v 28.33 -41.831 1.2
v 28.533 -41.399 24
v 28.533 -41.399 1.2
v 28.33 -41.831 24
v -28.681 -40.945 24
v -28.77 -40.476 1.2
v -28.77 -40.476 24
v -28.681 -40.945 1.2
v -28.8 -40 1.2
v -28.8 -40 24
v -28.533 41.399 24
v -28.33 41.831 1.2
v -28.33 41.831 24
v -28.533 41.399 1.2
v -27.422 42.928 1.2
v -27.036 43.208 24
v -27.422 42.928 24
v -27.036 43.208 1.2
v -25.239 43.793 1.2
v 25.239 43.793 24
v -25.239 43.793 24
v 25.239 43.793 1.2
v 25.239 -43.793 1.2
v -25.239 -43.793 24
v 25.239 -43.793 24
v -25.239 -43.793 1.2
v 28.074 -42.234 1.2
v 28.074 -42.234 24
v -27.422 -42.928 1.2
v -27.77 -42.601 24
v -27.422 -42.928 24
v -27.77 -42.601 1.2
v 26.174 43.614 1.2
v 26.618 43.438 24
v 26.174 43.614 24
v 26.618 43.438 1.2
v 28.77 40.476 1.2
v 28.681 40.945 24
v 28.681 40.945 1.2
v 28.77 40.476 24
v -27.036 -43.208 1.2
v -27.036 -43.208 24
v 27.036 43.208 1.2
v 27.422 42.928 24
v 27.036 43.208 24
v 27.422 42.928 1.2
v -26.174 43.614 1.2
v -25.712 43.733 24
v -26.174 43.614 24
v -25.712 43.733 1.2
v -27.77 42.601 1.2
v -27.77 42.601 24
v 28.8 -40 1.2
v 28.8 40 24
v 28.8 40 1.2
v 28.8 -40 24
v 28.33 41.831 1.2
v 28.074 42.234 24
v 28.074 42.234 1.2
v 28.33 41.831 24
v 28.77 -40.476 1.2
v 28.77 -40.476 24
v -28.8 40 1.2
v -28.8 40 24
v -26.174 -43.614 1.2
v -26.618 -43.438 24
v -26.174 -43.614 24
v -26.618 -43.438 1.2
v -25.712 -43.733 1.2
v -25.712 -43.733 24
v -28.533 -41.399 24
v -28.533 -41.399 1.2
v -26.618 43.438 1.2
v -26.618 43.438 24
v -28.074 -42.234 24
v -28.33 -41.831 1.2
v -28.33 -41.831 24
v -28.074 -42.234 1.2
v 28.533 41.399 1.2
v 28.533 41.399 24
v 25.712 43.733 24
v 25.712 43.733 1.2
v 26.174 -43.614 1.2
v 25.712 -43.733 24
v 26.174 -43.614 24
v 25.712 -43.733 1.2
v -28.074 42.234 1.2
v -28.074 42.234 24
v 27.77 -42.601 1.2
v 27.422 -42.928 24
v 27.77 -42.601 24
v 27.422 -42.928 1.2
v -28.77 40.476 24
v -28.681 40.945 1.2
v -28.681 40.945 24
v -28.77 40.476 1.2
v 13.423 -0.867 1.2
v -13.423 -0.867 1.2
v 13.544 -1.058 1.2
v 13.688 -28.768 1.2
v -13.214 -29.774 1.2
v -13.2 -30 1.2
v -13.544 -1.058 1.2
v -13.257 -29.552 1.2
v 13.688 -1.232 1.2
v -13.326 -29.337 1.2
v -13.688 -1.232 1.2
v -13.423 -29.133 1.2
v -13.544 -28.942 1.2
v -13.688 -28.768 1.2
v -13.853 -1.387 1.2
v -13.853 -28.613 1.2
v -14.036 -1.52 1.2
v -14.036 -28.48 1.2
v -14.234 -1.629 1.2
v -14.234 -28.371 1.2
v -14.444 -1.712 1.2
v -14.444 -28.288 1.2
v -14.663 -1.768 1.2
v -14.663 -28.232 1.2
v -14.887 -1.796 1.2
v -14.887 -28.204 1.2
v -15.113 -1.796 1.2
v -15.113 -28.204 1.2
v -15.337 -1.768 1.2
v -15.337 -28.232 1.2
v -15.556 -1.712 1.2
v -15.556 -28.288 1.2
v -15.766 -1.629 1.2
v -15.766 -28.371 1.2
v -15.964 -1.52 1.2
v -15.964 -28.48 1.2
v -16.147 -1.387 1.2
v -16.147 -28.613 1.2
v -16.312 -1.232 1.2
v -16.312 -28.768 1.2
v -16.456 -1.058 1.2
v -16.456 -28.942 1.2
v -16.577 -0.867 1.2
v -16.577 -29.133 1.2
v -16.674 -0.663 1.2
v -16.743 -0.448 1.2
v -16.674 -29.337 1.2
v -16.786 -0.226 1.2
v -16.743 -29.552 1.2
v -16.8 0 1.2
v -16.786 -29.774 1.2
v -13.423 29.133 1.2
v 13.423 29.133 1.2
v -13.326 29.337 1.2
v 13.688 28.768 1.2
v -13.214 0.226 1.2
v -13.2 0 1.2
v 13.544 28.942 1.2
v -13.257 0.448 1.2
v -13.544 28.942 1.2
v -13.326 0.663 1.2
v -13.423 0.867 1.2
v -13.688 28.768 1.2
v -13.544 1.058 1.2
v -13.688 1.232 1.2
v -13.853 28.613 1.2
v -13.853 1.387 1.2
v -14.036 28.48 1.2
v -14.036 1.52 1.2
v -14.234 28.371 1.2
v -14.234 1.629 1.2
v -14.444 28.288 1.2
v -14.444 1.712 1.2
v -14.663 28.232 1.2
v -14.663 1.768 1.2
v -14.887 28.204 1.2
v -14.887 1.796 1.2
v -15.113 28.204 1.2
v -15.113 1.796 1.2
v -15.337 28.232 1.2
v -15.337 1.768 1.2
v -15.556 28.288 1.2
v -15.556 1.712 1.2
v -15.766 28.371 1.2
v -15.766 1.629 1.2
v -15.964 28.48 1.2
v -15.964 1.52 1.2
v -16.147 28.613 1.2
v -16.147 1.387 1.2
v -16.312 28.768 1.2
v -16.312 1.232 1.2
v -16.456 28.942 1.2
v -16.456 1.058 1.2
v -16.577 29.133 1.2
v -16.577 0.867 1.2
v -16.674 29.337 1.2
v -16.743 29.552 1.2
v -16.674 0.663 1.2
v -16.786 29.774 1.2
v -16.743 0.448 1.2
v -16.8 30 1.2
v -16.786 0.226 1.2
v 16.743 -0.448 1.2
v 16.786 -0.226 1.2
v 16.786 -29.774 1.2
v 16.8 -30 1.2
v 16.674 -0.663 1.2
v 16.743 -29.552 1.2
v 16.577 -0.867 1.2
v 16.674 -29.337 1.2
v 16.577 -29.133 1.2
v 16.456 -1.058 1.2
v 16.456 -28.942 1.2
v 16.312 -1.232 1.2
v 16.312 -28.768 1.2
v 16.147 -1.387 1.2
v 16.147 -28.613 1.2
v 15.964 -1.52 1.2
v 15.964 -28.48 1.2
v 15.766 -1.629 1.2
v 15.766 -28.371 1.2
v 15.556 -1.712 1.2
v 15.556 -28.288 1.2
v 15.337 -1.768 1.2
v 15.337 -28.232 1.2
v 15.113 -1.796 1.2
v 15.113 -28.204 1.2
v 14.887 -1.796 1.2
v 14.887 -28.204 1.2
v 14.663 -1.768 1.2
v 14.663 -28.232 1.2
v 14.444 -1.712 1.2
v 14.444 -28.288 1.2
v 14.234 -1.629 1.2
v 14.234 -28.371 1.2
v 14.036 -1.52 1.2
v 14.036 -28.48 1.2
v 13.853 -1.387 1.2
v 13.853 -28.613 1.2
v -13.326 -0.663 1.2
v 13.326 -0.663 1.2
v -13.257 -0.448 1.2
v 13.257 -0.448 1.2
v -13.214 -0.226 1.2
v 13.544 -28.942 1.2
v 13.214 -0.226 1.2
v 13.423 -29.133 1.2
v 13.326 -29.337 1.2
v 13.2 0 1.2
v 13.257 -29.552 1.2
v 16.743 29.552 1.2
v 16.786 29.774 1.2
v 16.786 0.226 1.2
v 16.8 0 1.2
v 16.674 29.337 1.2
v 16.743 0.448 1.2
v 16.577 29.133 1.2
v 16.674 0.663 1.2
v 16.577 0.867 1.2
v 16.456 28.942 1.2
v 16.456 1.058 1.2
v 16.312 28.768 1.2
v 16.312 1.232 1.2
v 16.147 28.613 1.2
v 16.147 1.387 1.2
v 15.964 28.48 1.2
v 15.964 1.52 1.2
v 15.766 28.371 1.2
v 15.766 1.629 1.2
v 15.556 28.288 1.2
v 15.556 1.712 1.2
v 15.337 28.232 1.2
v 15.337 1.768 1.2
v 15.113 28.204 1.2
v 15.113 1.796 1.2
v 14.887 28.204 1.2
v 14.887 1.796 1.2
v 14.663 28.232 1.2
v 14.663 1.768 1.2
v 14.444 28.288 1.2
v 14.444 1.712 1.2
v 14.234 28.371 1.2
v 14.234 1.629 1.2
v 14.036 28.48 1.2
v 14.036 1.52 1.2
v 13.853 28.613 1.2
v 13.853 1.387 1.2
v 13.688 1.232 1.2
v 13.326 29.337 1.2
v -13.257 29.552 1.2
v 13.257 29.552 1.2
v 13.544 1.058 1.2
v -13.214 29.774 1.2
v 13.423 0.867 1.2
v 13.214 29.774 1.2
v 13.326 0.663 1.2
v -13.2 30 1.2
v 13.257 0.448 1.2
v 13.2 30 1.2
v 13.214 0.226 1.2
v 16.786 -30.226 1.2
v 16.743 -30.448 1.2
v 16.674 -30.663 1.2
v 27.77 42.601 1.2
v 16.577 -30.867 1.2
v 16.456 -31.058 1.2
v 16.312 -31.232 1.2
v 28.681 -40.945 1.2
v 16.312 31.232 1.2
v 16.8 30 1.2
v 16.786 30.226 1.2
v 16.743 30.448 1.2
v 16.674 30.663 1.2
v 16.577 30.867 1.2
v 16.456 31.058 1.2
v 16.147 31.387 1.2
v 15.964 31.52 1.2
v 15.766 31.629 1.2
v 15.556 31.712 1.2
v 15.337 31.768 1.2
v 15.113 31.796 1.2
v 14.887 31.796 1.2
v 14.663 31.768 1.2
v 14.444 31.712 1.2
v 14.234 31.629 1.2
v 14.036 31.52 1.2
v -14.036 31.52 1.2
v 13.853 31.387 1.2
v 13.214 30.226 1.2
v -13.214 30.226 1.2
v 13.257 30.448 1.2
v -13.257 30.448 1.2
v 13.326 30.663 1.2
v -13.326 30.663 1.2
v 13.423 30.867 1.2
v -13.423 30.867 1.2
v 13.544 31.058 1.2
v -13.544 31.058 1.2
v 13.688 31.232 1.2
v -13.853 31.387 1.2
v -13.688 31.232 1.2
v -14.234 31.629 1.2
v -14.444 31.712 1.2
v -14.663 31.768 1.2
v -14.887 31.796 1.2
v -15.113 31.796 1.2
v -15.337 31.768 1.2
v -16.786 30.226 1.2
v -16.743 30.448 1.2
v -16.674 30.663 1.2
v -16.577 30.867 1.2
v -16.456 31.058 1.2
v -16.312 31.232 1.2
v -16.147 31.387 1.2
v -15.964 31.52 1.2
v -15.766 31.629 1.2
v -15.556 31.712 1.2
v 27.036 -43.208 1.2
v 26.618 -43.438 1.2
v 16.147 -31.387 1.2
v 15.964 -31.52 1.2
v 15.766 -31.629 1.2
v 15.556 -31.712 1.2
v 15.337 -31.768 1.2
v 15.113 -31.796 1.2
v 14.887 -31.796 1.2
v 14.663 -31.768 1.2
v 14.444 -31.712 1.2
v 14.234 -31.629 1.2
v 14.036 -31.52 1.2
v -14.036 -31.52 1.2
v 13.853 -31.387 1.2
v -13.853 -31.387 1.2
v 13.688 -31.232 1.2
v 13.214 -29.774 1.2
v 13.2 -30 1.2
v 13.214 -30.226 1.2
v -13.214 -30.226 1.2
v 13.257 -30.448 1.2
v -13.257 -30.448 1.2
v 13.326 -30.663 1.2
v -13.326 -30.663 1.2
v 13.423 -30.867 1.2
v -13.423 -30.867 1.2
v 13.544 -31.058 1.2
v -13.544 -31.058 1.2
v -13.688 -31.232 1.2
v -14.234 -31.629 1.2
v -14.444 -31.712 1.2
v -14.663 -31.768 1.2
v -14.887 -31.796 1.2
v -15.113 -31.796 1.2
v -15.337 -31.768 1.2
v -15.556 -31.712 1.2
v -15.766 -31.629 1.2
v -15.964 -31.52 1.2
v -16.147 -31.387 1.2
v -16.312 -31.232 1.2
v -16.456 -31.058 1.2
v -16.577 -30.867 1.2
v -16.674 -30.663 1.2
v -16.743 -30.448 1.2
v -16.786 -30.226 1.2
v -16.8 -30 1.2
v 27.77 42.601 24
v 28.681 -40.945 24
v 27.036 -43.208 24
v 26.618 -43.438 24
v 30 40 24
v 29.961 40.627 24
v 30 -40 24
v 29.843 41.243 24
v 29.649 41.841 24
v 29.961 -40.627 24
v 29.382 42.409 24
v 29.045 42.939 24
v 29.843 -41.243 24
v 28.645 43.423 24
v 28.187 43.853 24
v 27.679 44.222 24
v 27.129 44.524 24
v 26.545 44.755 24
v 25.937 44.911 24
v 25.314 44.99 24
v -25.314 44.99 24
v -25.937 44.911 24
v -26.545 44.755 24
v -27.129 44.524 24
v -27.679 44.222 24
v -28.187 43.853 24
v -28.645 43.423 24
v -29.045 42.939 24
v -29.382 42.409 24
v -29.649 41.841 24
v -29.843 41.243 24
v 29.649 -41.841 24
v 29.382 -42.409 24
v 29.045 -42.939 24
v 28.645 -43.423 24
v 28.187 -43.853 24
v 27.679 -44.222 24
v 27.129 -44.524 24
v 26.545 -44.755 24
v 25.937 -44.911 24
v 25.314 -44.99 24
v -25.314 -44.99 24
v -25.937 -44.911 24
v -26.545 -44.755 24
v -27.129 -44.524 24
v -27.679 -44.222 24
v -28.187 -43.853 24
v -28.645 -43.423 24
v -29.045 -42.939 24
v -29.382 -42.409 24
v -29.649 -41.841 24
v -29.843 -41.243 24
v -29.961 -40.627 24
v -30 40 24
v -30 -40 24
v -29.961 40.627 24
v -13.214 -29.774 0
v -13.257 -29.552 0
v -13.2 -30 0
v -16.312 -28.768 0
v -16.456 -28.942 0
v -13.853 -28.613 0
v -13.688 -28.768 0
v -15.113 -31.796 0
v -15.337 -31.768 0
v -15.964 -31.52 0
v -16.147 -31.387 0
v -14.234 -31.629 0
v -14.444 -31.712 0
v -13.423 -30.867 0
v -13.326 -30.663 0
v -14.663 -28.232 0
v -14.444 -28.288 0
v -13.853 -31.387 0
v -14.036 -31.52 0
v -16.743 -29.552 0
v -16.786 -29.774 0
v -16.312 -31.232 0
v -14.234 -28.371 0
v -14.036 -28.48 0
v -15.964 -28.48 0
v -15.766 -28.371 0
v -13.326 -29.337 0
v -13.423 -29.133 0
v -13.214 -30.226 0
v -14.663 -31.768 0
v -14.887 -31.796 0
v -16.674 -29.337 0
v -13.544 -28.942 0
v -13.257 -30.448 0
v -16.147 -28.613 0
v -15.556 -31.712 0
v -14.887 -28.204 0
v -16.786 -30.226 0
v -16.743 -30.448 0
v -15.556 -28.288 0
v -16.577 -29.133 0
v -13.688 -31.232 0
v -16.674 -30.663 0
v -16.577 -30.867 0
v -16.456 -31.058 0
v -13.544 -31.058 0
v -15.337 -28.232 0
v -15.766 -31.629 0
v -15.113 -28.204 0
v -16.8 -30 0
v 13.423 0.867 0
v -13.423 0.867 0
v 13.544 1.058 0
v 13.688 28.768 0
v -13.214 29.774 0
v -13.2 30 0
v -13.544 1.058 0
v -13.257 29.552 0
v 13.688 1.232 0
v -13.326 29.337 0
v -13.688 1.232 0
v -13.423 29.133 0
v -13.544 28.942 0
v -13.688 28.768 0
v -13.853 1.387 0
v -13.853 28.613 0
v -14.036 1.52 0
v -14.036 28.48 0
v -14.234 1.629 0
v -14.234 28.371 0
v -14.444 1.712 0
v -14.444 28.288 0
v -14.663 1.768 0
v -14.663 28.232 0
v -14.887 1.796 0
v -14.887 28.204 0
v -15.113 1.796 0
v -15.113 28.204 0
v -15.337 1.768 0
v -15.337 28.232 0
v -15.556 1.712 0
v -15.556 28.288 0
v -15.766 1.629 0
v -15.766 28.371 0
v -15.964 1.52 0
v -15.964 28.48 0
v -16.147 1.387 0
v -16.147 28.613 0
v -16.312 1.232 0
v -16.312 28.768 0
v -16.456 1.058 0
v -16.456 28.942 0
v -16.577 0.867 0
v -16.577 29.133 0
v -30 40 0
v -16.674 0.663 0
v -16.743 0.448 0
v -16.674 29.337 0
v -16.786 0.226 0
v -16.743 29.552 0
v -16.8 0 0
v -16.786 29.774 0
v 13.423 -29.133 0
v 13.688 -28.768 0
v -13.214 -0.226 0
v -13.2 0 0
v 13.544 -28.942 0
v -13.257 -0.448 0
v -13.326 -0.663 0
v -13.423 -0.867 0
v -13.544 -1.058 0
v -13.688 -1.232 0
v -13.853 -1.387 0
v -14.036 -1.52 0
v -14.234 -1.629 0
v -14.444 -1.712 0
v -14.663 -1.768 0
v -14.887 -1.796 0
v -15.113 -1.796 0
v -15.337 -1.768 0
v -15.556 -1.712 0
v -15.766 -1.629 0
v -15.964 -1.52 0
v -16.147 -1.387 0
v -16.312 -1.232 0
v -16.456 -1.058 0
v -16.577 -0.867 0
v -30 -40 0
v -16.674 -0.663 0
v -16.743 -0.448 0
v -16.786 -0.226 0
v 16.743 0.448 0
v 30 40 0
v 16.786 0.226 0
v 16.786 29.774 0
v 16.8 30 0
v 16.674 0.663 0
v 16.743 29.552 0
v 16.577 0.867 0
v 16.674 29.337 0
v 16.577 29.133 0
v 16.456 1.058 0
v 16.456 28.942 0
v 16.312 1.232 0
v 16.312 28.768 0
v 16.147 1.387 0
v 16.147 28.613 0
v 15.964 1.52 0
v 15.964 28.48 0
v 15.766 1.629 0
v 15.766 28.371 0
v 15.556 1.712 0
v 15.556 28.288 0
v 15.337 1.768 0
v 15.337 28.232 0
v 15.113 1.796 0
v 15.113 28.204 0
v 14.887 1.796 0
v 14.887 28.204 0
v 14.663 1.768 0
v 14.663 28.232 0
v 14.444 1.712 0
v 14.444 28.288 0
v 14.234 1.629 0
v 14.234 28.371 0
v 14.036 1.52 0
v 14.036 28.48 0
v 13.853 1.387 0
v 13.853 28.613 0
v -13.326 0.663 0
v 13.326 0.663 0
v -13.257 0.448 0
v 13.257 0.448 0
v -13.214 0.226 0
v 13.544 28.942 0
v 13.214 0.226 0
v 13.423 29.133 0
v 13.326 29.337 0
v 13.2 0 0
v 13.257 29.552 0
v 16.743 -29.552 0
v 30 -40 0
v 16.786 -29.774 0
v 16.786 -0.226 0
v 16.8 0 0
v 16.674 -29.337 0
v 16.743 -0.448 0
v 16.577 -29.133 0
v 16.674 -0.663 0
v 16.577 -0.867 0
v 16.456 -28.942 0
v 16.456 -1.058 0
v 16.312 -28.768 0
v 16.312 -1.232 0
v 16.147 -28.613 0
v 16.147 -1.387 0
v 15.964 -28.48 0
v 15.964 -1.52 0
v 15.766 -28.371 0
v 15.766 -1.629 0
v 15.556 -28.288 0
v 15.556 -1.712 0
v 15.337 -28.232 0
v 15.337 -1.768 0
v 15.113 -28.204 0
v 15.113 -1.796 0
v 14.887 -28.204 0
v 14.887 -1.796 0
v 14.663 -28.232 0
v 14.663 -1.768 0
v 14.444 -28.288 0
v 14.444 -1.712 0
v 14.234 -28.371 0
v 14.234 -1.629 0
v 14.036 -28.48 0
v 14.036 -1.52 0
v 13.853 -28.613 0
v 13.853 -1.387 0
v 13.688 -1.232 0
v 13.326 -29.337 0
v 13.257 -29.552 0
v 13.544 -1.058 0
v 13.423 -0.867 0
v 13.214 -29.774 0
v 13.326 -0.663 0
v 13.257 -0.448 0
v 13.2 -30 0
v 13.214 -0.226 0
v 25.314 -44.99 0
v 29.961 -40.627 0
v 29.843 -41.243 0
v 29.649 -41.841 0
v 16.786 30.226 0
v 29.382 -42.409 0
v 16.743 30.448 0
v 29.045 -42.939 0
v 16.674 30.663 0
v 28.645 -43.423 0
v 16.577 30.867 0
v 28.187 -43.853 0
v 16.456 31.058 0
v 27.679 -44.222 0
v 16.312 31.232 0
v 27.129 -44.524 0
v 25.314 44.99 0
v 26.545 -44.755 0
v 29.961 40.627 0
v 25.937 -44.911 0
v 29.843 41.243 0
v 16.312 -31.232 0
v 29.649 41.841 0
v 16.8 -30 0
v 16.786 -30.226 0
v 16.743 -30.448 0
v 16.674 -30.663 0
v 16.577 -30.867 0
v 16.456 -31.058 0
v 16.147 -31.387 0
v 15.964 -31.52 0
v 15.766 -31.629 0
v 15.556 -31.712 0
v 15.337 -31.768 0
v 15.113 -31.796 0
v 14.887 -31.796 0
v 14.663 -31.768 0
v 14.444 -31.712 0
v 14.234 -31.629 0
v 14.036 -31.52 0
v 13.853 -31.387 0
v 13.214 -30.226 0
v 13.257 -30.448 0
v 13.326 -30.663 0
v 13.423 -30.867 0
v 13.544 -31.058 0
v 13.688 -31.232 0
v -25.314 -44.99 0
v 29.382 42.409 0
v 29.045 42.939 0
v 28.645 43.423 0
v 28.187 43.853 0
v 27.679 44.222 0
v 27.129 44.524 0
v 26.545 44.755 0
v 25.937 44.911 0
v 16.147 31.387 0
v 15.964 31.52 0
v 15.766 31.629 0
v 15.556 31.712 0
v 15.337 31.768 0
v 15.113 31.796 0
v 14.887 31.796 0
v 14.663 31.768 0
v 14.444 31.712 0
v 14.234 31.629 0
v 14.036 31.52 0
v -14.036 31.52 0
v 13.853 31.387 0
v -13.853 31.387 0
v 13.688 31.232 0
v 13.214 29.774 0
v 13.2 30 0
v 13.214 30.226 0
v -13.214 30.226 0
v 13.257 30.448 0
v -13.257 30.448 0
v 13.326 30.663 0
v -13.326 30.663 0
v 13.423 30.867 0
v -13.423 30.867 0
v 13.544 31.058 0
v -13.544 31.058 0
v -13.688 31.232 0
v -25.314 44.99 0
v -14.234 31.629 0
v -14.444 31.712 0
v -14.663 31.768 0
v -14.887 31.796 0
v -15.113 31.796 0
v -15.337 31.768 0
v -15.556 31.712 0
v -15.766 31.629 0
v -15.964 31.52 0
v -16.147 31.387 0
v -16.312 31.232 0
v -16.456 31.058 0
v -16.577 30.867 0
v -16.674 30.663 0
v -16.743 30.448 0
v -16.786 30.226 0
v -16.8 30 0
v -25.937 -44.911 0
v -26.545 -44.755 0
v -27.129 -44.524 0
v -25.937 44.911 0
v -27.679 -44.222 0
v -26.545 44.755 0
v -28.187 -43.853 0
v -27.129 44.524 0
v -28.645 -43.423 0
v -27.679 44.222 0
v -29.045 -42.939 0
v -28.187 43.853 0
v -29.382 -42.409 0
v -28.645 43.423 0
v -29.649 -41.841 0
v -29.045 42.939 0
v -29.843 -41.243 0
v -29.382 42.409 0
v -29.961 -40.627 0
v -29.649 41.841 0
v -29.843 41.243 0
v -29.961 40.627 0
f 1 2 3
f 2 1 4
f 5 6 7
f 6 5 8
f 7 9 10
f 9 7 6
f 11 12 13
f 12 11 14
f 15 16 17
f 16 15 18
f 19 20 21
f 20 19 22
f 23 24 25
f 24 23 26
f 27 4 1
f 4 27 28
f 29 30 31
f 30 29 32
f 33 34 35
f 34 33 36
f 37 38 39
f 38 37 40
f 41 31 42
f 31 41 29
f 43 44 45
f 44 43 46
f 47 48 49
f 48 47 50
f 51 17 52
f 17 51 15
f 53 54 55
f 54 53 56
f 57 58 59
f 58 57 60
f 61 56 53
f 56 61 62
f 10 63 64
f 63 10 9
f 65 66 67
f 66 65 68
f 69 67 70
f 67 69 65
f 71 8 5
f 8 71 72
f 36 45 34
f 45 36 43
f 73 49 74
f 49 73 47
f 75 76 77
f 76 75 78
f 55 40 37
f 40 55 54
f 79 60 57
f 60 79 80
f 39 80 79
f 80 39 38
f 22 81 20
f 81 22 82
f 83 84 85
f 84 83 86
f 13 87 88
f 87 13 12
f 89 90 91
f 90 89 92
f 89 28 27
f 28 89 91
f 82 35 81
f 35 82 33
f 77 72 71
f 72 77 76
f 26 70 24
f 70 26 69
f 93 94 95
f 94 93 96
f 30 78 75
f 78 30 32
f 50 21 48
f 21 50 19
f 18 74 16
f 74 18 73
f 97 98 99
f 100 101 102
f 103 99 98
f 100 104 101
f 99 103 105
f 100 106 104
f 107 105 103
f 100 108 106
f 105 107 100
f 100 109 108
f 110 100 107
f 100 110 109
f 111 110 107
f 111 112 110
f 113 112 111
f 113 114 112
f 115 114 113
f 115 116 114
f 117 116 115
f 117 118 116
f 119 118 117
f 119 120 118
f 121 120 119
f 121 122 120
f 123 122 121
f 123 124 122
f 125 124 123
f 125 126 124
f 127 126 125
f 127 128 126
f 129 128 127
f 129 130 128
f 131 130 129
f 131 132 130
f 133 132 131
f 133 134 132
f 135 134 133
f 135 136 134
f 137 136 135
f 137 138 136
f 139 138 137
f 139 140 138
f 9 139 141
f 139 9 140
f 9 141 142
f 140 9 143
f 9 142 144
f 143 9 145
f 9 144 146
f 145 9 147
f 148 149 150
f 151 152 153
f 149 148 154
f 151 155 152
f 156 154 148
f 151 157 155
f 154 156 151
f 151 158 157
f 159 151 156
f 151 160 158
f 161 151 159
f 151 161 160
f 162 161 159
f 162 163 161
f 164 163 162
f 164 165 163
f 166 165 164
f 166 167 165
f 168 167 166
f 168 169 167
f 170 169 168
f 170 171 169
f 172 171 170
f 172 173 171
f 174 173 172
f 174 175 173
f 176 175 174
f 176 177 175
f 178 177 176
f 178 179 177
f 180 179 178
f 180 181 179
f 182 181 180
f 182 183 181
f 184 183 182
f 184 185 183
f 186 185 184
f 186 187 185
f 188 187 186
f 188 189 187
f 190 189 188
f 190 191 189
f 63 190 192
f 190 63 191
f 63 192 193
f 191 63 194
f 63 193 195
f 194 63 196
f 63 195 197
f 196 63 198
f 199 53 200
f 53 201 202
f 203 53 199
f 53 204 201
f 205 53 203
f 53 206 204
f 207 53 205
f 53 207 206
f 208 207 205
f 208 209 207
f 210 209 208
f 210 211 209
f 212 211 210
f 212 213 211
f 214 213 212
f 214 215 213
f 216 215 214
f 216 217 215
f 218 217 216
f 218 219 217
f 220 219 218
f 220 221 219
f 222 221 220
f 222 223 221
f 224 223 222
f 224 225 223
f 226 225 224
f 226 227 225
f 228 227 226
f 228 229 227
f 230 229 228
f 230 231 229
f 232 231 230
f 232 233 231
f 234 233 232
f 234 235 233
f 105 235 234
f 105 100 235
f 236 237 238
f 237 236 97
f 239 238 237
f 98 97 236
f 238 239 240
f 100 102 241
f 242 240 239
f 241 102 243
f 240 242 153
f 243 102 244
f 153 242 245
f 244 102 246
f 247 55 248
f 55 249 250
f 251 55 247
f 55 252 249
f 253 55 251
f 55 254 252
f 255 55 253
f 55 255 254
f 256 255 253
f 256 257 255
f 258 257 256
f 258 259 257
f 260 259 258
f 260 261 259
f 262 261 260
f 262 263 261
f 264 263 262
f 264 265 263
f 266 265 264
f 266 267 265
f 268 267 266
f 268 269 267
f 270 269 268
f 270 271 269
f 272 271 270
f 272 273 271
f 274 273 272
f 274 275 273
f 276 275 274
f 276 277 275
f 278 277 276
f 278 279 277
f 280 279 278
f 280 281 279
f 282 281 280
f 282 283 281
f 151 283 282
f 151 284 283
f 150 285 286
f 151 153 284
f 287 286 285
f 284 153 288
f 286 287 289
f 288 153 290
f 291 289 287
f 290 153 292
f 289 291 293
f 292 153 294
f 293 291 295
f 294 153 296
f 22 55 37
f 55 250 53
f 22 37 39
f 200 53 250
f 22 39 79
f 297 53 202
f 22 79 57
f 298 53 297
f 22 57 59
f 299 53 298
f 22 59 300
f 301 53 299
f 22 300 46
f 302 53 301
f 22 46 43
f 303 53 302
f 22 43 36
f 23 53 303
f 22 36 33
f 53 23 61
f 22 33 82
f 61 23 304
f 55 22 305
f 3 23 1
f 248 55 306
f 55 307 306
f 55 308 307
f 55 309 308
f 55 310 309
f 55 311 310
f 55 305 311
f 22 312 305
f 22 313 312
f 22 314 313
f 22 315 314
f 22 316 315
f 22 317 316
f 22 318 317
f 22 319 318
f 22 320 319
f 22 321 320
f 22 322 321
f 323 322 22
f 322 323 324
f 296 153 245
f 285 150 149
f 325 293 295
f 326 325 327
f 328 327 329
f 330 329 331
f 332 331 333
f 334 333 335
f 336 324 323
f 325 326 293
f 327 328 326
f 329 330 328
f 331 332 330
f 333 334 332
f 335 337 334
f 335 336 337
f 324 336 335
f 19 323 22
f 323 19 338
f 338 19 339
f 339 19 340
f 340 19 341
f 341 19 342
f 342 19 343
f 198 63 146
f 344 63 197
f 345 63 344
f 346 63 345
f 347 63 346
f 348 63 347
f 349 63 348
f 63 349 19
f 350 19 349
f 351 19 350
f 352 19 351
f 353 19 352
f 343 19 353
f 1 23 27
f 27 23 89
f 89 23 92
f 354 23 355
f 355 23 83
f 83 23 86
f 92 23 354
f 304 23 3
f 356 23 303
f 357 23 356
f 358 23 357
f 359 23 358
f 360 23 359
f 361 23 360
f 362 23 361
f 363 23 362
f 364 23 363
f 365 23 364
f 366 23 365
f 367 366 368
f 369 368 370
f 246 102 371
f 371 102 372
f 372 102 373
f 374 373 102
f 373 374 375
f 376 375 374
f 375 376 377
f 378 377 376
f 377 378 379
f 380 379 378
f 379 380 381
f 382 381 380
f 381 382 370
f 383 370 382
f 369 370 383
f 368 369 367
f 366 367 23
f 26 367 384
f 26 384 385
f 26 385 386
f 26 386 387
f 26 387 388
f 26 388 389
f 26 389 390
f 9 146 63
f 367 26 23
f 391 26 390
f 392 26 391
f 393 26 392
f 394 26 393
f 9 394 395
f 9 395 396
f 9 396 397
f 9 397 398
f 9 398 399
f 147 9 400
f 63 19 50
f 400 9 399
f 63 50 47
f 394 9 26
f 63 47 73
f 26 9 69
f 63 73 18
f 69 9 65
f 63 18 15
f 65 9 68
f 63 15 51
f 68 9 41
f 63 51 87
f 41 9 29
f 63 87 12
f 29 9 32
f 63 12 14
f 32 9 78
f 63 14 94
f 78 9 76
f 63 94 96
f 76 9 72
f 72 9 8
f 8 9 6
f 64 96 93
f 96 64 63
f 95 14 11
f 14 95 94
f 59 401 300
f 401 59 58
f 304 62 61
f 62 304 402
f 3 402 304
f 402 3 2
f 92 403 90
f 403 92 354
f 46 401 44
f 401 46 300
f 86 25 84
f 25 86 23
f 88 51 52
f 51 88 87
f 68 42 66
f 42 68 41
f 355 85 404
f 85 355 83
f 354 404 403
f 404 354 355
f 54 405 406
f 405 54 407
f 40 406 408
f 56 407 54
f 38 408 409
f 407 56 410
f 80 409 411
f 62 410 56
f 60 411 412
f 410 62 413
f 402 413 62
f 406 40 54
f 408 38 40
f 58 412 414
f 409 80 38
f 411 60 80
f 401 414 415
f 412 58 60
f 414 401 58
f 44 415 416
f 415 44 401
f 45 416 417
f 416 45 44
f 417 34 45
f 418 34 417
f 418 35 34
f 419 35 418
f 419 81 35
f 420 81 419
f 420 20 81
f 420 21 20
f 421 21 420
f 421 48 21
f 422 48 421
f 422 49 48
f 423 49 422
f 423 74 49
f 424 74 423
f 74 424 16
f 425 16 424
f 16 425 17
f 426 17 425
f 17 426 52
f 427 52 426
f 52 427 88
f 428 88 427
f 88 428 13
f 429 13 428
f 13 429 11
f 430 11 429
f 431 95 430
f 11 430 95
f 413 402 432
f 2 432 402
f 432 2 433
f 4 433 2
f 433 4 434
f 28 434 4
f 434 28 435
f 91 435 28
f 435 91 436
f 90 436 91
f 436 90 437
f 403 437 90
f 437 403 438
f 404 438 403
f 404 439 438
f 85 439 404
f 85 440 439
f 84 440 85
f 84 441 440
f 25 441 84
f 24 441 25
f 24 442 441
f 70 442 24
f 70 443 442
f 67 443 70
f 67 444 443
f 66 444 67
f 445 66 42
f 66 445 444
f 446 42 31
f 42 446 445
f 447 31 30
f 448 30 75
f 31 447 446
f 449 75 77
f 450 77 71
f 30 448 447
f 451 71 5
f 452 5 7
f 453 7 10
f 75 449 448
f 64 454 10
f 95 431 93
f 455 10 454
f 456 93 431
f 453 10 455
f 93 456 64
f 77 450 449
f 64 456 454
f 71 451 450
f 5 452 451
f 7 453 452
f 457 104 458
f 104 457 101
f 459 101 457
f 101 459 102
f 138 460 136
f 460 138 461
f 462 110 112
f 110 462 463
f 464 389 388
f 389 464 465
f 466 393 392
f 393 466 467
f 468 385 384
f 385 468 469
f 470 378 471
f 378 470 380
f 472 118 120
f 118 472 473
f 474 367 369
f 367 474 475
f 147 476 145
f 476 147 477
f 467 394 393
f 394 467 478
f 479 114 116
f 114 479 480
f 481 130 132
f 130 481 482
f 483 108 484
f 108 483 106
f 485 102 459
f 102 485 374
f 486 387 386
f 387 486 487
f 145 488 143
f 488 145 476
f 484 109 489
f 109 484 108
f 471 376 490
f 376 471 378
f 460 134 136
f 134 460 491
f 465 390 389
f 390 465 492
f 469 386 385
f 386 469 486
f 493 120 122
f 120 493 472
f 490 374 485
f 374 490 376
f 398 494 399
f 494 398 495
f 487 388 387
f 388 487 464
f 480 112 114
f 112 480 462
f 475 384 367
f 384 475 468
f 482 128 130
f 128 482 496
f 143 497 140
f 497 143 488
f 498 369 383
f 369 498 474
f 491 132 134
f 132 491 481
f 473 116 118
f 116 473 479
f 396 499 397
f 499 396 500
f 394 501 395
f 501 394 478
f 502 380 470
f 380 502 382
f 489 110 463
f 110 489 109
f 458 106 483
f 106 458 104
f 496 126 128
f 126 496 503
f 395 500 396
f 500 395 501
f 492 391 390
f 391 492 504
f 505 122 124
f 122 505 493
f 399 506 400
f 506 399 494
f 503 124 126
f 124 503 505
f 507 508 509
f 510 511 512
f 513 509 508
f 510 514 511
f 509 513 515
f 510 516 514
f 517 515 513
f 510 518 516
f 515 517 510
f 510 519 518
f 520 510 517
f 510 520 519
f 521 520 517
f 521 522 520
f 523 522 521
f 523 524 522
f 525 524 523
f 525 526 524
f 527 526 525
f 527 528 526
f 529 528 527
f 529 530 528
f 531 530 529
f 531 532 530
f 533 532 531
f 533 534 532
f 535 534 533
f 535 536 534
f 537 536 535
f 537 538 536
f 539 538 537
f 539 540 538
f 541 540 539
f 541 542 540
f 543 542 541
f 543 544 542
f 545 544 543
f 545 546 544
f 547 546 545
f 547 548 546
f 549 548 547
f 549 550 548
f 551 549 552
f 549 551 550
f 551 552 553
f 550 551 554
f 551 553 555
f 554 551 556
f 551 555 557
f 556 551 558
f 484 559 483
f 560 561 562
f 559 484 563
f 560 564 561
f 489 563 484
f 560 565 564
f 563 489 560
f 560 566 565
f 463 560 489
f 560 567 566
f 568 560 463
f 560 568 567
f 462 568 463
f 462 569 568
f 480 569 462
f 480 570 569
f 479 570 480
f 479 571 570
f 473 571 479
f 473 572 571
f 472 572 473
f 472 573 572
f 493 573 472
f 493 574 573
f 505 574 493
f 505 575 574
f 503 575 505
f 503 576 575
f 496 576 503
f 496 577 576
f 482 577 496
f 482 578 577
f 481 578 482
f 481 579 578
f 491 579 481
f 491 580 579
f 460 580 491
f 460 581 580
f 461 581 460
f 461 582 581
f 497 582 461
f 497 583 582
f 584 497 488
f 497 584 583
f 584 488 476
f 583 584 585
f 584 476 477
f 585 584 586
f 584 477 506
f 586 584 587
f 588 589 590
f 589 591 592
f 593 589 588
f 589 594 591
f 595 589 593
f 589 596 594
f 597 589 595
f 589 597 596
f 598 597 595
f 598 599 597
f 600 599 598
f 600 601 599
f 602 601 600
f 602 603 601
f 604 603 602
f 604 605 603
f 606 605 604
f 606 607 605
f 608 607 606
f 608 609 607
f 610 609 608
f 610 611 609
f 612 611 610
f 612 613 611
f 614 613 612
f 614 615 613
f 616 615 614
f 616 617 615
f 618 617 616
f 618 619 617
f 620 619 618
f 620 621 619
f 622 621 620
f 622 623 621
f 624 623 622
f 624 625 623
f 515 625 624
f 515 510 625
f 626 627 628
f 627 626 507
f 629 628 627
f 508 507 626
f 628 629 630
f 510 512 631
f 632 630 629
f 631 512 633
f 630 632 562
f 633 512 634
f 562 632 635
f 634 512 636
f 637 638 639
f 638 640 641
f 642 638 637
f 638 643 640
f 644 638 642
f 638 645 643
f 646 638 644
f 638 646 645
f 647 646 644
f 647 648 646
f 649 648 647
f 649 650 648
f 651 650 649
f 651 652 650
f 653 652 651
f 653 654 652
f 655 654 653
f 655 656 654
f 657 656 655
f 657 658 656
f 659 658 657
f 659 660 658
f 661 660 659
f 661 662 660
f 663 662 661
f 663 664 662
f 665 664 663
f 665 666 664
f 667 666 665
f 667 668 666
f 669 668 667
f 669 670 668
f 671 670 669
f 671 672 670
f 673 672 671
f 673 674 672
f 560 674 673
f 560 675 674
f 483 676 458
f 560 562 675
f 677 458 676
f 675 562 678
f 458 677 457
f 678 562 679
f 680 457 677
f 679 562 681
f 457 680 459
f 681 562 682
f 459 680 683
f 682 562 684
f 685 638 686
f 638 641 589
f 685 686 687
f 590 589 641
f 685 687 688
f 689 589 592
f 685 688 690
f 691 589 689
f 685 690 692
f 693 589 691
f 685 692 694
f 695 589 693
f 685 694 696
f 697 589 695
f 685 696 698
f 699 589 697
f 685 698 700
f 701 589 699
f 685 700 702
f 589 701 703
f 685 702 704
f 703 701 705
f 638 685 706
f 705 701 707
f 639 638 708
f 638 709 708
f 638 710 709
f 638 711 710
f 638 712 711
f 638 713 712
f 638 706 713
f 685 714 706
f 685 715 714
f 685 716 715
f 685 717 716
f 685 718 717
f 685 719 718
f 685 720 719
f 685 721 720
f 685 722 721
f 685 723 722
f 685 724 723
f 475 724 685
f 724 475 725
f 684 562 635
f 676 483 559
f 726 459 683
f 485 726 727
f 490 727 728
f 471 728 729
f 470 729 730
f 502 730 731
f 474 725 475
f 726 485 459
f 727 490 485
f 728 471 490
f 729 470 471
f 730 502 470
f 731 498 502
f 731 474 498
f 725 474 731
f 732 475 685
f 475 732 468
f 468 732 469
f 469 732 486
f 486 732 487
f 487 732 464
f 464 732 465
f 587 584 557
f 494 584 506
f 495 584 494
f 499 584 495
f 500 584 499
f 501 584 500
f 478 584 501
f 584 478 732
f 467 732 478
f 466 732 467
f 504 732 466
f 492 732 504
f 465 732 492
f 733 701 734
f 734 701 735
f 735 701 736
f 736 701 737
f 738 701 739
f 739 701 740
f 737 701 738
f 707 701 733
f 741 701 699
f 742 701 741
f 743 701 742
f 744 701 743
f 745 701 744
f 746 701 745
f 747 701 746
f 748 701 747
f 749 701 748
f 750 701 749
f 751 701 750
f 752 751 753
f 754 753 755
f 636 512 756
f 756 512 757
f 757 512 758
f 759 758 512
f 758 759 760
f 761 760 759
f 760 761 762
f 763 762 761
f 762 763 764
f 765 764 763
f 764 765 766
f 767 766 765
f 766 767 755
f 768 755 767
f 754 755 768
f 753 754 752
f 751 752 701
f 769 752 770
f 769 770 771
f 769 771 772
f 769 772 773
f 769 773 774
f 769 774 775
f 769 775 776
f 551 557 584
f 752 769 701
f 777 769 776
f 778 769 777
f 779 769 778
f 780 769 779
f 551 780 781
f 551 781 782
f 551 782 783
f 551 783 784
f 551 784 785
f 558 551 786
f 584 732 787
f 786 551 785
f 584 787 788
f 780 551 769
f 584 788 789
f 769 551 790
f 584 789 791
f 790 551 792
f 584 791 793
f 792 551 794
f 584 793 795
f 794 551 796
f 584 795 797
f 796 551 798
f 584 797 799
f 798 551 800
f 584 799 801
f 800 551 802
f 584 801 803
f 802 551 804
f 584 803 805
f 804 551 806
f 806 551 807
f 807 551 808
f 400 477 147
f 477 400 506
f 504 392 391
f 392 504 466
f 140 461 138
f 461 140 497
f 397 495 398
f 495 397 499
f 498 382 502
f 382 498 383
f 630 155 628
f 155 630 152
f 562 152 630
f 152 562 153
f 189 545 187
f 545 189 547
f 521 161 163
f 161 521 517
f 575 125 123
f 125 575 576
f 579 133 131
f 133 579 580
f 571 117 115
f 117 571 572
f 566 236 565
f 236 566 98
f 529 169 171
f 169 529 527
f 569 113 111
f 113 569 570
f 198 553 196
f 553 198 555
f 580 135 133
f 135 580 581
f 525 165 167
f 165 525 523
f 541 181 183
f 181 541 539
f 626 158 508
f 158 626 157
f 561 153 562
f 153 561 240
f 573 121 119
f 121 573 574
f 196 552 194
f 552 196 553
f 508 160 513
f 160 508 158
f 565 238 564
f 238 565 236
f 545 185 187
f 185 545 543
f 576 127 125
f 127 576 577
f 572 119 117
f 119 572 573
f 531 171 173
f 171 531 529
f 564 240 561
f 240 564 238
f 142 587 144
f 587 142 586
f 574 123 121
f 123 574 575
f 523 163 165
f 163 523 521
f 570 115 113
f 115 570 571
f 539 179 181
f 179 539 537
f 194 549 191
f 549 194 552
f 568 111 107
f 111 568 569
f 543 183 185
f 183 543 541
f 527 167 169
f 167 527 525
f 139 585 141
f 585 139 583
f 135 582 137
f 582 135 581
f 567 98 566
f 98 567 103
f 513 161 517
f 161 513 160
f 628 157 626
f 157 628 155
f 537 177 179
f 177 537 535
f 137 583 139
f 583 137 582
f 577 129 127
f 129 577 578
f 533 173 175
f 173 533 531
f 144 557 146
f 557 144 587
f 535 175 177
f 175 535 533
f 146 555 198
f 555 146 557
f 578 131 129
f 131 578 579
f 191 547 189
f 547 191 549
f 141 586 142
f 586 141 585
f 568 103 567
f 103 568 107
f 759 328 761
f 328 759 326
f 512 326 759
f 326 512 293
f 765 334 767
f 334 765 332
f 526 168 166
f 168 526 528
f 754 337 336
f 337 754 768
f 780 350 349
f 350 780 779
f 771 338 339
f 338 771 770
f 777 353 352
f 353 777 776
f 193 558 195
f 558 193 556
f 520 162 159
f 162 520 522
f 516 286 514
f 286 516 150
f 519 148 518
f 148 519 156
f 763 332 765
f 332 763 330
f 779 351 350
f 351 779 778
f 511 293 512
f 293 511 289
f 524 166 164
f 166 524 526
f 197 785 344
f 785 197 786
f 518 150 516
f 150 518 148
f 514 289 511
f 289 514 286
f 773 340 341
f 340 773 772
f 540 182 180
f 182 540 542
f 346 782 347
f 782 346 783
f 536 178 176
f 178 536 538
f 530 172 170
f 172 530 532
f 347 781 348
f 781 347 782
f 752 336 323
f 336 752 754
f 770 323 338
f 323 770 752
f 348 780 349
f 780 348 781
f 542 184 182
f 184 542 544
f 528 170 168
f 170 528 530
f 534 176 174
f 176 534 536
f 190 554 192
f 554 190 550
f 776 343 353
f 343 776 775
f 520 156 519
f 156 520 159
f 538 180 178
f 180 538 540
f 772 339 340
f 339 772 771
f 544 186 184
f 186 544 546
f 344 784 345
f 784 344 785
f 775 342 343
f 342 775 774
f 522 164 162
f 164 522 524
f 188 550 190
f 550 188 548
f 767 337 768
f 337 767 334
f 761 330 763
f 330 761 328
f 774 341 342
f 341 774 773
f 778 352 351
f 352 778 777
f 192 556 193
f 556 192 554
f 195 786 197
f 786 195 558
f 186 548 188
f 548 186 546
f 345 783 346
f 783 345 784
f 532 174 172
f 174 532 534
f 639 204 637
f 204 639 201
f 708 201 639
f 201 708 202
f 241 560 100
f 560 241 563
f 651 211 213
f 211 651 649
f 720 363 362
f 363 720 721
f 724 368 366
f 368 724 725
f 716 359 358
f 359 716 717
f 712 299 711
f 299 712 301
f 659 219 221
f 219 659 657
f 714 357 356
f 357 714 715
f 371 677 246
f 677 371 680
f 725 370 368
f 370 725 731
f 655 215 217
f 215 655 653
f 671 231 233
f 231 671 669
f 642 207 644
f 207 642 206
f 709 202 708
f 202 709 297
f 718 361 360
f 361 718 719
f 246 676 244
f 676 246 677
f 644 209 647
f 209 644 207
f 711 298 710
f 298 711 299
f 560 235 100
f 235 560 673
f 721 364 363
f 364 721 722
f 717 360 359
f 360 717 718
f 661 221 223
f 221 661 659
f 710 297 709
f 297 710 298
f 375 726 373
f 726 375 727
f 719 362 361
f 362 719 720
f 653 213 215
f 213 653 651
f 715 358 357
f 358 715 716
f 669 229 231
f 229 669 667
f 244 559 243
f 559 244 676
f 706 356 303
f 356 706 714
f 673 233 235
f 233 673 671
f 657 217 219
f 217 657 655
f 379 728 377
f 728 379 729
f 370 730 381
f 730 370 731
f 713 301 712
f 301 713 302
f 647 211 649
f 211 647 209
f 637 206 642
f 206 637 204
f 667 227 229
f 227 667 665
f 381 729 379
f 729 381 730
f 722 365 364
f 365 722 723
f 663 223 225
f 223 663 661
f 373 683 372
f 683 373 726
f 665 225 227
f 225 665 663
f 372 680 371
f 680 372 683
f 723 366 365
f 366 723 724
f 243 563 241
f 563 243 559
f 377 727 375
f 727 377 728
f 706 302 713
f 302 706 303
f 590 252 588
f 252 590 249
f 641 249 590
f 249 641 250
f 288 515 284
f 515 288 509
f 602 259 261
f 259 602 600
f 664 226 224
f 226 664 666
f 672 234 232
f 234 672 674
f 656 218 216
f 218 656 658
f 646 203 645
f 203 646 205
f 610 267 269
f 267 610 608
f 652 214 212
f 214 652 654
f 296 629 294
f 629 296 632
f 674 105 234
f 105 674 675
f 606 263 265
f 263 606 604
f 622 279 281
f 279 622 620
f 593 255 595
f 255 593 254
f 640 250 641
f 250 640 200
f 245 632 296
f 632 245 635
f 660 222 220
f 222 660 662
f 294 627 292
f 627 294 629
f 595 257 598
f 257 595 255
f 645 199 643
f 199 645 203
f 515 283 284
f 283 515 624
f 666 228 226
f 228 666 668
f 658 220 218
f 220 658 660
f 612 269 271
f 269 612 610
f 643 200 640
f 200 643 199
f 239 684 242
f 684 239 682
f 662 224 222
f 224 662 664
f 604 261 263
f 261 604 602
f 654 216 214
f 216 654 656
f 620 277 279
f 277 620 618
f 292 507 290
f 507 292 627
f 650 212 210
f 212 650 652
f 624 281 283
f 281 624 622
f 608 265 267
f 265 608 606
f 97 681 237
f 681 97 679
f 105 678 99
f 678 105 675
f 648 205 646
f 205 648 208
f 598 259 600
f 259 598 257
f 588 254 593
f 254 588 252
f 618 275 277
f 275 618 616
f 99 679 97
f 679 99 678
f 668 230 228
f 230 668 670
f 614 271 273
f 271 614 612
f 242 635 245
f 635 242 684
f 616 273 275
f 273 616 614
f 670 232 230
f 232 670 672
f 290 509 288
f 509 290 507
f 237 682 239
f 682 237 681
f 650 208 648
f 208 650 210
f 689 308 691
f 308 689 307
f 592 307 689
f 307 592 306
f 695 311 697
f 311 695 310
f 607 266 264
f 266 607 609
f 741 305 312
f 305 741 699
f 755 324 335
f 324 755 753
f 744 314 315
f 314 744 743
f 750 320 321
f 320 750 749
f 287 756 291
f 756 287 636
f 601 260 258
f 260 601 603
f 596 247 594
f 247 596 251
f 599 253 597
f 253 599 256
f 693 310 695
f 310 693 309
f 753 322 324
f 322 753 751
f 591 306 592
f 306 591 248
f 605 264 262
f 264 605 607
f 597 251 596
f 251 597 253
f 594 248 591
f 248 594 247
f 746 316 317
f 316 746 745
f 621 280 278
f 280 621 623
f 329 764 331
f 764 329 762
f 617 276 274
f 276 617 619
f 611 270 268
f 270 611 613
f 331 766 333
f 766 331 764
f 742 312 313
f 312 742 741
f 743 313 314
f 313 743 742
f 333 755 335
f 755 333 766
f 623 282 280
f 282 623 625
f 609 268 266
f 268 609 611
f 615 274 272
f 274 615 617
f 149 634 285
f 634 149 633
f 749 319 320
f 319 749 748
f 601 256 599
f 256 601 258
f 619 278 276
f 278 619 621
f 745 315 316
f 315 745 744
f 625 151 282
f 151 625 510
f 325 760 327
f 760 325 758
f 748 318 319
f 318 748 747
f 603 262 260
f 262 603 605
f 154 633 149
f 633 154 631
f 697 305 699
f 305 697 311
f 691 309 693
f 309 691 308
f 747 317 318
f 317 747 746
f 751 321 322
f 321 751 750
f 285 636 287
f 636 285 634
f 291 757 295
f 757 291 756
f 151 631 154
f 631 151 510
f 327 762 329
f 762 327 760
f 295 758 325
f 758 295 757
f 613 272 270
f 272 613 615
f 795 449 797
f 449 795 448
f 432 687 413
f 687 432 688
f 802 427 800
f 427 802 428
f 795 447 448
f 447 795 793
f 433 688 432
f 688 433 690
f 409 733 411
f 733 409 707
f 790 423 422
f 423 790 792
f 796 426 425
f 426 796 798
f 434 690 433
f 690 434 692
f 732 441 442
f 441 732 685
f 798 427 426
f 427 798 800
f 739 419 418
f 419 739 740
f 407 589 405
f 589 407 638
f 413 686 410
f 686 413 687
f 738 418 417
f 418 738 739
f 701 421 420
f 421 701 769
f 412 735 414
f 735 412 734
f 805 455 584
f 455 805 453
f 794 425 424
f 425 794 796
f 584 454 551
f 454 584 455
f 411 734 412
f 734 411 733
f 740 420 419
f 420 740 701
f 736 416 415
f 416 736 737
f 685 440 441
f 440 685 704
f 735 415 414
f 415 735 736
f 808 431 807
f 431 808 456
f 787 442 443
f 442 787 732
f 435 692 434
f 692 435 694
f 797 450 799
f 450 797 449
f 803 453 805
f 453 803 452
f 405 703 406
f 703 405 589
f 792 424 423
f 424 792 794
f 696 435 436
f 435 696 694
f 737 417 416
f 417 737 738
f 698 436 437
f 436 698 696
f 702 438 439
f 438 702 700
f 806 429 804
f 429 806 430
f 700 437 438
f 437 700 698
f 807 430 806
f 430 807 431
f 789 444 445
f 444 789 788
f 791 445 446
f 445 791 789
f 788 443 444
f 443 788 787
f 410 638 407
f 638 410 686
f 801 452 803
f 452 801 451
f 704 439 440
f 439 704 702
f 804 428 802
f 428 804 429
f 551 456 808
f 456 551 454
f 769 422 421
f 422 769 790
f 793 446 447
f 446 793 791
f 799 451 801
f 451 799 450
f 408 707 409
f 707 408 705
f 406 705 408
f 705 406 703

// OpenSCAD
$fn = 50;


difference() {
	union() {
		hull() {
			translate(v = [-25.0000000000, 40.0000000000, 0]) {
				cylinder(h = 24, r = 5);
			}
			translate(v = [25.0000000000, 40.0000000000, 0]) {
				cylinder(h = 24, r = 5);
			}
			translate(v = [-25.0000000000, -40.0000000000, 0]) {
				cylinder(h = 24, r = 5);
			}
			translate(v = [25.0000000000, -40.0000000000, 0]) {
				cylinder(h = 24, r = 5);
			}
		}
	}
	union() {
		translate(v = [0, 0, 1.2000000000]) {
			hull() {
				translate(v = [-25.0000000000, 40.0000000000, 0]) {
					cylinder(h = 22.8000000000, r = 3.8000000000);
				}
				translate(v = [25.0000000000, 40.0000000000, 0]) {
					cylinder(h = 22.8000000000, r = 3.8000000000);
				}
				translate(v = [-25.0000000000, -40.0000000000, 0]) {
					cylinder(h = 22.8000000000, r = 3.8000000000);
				}
				translate(v = [25.0000000000, -40.0000000000, 0]) {
					cylinder(h = 22.8000000000, r = 3.8000000000);
				}
			}
		}
		#translate(v = [-15.0000000000, -30.0000000000, 0]) {
			cylinder(h = 1.2000000000, r = 1.8000000000);
		}
		#translate(v = [-15.0000000000, 0.0000000000, 0]) {
			cylinder(h = 1.2000000000, r = 1.8000000000);
		}
		#translate(v = [-15.0000000000, 30.0000000000, 0]) {
			cylinder(h = 1.2000000000, r = 1.8000000000);
		}
		#translate(v = [15.0000000000, -30.0000000000, 0]) {
			cylinder(h = 1.2000000000, r = 1.8000000000);
		}
		#translate(v = [15.0000000000, 0.0000000000, 0]) {
			cylinder(h = 1.2000000000, r = 1.8000000000);
		}
		#translate(v = [15.0000000000, 30.0000000000, 0]) {
			cylinder(h = 1.2000000000, r = 1.8000000000);
		}
	}
}
